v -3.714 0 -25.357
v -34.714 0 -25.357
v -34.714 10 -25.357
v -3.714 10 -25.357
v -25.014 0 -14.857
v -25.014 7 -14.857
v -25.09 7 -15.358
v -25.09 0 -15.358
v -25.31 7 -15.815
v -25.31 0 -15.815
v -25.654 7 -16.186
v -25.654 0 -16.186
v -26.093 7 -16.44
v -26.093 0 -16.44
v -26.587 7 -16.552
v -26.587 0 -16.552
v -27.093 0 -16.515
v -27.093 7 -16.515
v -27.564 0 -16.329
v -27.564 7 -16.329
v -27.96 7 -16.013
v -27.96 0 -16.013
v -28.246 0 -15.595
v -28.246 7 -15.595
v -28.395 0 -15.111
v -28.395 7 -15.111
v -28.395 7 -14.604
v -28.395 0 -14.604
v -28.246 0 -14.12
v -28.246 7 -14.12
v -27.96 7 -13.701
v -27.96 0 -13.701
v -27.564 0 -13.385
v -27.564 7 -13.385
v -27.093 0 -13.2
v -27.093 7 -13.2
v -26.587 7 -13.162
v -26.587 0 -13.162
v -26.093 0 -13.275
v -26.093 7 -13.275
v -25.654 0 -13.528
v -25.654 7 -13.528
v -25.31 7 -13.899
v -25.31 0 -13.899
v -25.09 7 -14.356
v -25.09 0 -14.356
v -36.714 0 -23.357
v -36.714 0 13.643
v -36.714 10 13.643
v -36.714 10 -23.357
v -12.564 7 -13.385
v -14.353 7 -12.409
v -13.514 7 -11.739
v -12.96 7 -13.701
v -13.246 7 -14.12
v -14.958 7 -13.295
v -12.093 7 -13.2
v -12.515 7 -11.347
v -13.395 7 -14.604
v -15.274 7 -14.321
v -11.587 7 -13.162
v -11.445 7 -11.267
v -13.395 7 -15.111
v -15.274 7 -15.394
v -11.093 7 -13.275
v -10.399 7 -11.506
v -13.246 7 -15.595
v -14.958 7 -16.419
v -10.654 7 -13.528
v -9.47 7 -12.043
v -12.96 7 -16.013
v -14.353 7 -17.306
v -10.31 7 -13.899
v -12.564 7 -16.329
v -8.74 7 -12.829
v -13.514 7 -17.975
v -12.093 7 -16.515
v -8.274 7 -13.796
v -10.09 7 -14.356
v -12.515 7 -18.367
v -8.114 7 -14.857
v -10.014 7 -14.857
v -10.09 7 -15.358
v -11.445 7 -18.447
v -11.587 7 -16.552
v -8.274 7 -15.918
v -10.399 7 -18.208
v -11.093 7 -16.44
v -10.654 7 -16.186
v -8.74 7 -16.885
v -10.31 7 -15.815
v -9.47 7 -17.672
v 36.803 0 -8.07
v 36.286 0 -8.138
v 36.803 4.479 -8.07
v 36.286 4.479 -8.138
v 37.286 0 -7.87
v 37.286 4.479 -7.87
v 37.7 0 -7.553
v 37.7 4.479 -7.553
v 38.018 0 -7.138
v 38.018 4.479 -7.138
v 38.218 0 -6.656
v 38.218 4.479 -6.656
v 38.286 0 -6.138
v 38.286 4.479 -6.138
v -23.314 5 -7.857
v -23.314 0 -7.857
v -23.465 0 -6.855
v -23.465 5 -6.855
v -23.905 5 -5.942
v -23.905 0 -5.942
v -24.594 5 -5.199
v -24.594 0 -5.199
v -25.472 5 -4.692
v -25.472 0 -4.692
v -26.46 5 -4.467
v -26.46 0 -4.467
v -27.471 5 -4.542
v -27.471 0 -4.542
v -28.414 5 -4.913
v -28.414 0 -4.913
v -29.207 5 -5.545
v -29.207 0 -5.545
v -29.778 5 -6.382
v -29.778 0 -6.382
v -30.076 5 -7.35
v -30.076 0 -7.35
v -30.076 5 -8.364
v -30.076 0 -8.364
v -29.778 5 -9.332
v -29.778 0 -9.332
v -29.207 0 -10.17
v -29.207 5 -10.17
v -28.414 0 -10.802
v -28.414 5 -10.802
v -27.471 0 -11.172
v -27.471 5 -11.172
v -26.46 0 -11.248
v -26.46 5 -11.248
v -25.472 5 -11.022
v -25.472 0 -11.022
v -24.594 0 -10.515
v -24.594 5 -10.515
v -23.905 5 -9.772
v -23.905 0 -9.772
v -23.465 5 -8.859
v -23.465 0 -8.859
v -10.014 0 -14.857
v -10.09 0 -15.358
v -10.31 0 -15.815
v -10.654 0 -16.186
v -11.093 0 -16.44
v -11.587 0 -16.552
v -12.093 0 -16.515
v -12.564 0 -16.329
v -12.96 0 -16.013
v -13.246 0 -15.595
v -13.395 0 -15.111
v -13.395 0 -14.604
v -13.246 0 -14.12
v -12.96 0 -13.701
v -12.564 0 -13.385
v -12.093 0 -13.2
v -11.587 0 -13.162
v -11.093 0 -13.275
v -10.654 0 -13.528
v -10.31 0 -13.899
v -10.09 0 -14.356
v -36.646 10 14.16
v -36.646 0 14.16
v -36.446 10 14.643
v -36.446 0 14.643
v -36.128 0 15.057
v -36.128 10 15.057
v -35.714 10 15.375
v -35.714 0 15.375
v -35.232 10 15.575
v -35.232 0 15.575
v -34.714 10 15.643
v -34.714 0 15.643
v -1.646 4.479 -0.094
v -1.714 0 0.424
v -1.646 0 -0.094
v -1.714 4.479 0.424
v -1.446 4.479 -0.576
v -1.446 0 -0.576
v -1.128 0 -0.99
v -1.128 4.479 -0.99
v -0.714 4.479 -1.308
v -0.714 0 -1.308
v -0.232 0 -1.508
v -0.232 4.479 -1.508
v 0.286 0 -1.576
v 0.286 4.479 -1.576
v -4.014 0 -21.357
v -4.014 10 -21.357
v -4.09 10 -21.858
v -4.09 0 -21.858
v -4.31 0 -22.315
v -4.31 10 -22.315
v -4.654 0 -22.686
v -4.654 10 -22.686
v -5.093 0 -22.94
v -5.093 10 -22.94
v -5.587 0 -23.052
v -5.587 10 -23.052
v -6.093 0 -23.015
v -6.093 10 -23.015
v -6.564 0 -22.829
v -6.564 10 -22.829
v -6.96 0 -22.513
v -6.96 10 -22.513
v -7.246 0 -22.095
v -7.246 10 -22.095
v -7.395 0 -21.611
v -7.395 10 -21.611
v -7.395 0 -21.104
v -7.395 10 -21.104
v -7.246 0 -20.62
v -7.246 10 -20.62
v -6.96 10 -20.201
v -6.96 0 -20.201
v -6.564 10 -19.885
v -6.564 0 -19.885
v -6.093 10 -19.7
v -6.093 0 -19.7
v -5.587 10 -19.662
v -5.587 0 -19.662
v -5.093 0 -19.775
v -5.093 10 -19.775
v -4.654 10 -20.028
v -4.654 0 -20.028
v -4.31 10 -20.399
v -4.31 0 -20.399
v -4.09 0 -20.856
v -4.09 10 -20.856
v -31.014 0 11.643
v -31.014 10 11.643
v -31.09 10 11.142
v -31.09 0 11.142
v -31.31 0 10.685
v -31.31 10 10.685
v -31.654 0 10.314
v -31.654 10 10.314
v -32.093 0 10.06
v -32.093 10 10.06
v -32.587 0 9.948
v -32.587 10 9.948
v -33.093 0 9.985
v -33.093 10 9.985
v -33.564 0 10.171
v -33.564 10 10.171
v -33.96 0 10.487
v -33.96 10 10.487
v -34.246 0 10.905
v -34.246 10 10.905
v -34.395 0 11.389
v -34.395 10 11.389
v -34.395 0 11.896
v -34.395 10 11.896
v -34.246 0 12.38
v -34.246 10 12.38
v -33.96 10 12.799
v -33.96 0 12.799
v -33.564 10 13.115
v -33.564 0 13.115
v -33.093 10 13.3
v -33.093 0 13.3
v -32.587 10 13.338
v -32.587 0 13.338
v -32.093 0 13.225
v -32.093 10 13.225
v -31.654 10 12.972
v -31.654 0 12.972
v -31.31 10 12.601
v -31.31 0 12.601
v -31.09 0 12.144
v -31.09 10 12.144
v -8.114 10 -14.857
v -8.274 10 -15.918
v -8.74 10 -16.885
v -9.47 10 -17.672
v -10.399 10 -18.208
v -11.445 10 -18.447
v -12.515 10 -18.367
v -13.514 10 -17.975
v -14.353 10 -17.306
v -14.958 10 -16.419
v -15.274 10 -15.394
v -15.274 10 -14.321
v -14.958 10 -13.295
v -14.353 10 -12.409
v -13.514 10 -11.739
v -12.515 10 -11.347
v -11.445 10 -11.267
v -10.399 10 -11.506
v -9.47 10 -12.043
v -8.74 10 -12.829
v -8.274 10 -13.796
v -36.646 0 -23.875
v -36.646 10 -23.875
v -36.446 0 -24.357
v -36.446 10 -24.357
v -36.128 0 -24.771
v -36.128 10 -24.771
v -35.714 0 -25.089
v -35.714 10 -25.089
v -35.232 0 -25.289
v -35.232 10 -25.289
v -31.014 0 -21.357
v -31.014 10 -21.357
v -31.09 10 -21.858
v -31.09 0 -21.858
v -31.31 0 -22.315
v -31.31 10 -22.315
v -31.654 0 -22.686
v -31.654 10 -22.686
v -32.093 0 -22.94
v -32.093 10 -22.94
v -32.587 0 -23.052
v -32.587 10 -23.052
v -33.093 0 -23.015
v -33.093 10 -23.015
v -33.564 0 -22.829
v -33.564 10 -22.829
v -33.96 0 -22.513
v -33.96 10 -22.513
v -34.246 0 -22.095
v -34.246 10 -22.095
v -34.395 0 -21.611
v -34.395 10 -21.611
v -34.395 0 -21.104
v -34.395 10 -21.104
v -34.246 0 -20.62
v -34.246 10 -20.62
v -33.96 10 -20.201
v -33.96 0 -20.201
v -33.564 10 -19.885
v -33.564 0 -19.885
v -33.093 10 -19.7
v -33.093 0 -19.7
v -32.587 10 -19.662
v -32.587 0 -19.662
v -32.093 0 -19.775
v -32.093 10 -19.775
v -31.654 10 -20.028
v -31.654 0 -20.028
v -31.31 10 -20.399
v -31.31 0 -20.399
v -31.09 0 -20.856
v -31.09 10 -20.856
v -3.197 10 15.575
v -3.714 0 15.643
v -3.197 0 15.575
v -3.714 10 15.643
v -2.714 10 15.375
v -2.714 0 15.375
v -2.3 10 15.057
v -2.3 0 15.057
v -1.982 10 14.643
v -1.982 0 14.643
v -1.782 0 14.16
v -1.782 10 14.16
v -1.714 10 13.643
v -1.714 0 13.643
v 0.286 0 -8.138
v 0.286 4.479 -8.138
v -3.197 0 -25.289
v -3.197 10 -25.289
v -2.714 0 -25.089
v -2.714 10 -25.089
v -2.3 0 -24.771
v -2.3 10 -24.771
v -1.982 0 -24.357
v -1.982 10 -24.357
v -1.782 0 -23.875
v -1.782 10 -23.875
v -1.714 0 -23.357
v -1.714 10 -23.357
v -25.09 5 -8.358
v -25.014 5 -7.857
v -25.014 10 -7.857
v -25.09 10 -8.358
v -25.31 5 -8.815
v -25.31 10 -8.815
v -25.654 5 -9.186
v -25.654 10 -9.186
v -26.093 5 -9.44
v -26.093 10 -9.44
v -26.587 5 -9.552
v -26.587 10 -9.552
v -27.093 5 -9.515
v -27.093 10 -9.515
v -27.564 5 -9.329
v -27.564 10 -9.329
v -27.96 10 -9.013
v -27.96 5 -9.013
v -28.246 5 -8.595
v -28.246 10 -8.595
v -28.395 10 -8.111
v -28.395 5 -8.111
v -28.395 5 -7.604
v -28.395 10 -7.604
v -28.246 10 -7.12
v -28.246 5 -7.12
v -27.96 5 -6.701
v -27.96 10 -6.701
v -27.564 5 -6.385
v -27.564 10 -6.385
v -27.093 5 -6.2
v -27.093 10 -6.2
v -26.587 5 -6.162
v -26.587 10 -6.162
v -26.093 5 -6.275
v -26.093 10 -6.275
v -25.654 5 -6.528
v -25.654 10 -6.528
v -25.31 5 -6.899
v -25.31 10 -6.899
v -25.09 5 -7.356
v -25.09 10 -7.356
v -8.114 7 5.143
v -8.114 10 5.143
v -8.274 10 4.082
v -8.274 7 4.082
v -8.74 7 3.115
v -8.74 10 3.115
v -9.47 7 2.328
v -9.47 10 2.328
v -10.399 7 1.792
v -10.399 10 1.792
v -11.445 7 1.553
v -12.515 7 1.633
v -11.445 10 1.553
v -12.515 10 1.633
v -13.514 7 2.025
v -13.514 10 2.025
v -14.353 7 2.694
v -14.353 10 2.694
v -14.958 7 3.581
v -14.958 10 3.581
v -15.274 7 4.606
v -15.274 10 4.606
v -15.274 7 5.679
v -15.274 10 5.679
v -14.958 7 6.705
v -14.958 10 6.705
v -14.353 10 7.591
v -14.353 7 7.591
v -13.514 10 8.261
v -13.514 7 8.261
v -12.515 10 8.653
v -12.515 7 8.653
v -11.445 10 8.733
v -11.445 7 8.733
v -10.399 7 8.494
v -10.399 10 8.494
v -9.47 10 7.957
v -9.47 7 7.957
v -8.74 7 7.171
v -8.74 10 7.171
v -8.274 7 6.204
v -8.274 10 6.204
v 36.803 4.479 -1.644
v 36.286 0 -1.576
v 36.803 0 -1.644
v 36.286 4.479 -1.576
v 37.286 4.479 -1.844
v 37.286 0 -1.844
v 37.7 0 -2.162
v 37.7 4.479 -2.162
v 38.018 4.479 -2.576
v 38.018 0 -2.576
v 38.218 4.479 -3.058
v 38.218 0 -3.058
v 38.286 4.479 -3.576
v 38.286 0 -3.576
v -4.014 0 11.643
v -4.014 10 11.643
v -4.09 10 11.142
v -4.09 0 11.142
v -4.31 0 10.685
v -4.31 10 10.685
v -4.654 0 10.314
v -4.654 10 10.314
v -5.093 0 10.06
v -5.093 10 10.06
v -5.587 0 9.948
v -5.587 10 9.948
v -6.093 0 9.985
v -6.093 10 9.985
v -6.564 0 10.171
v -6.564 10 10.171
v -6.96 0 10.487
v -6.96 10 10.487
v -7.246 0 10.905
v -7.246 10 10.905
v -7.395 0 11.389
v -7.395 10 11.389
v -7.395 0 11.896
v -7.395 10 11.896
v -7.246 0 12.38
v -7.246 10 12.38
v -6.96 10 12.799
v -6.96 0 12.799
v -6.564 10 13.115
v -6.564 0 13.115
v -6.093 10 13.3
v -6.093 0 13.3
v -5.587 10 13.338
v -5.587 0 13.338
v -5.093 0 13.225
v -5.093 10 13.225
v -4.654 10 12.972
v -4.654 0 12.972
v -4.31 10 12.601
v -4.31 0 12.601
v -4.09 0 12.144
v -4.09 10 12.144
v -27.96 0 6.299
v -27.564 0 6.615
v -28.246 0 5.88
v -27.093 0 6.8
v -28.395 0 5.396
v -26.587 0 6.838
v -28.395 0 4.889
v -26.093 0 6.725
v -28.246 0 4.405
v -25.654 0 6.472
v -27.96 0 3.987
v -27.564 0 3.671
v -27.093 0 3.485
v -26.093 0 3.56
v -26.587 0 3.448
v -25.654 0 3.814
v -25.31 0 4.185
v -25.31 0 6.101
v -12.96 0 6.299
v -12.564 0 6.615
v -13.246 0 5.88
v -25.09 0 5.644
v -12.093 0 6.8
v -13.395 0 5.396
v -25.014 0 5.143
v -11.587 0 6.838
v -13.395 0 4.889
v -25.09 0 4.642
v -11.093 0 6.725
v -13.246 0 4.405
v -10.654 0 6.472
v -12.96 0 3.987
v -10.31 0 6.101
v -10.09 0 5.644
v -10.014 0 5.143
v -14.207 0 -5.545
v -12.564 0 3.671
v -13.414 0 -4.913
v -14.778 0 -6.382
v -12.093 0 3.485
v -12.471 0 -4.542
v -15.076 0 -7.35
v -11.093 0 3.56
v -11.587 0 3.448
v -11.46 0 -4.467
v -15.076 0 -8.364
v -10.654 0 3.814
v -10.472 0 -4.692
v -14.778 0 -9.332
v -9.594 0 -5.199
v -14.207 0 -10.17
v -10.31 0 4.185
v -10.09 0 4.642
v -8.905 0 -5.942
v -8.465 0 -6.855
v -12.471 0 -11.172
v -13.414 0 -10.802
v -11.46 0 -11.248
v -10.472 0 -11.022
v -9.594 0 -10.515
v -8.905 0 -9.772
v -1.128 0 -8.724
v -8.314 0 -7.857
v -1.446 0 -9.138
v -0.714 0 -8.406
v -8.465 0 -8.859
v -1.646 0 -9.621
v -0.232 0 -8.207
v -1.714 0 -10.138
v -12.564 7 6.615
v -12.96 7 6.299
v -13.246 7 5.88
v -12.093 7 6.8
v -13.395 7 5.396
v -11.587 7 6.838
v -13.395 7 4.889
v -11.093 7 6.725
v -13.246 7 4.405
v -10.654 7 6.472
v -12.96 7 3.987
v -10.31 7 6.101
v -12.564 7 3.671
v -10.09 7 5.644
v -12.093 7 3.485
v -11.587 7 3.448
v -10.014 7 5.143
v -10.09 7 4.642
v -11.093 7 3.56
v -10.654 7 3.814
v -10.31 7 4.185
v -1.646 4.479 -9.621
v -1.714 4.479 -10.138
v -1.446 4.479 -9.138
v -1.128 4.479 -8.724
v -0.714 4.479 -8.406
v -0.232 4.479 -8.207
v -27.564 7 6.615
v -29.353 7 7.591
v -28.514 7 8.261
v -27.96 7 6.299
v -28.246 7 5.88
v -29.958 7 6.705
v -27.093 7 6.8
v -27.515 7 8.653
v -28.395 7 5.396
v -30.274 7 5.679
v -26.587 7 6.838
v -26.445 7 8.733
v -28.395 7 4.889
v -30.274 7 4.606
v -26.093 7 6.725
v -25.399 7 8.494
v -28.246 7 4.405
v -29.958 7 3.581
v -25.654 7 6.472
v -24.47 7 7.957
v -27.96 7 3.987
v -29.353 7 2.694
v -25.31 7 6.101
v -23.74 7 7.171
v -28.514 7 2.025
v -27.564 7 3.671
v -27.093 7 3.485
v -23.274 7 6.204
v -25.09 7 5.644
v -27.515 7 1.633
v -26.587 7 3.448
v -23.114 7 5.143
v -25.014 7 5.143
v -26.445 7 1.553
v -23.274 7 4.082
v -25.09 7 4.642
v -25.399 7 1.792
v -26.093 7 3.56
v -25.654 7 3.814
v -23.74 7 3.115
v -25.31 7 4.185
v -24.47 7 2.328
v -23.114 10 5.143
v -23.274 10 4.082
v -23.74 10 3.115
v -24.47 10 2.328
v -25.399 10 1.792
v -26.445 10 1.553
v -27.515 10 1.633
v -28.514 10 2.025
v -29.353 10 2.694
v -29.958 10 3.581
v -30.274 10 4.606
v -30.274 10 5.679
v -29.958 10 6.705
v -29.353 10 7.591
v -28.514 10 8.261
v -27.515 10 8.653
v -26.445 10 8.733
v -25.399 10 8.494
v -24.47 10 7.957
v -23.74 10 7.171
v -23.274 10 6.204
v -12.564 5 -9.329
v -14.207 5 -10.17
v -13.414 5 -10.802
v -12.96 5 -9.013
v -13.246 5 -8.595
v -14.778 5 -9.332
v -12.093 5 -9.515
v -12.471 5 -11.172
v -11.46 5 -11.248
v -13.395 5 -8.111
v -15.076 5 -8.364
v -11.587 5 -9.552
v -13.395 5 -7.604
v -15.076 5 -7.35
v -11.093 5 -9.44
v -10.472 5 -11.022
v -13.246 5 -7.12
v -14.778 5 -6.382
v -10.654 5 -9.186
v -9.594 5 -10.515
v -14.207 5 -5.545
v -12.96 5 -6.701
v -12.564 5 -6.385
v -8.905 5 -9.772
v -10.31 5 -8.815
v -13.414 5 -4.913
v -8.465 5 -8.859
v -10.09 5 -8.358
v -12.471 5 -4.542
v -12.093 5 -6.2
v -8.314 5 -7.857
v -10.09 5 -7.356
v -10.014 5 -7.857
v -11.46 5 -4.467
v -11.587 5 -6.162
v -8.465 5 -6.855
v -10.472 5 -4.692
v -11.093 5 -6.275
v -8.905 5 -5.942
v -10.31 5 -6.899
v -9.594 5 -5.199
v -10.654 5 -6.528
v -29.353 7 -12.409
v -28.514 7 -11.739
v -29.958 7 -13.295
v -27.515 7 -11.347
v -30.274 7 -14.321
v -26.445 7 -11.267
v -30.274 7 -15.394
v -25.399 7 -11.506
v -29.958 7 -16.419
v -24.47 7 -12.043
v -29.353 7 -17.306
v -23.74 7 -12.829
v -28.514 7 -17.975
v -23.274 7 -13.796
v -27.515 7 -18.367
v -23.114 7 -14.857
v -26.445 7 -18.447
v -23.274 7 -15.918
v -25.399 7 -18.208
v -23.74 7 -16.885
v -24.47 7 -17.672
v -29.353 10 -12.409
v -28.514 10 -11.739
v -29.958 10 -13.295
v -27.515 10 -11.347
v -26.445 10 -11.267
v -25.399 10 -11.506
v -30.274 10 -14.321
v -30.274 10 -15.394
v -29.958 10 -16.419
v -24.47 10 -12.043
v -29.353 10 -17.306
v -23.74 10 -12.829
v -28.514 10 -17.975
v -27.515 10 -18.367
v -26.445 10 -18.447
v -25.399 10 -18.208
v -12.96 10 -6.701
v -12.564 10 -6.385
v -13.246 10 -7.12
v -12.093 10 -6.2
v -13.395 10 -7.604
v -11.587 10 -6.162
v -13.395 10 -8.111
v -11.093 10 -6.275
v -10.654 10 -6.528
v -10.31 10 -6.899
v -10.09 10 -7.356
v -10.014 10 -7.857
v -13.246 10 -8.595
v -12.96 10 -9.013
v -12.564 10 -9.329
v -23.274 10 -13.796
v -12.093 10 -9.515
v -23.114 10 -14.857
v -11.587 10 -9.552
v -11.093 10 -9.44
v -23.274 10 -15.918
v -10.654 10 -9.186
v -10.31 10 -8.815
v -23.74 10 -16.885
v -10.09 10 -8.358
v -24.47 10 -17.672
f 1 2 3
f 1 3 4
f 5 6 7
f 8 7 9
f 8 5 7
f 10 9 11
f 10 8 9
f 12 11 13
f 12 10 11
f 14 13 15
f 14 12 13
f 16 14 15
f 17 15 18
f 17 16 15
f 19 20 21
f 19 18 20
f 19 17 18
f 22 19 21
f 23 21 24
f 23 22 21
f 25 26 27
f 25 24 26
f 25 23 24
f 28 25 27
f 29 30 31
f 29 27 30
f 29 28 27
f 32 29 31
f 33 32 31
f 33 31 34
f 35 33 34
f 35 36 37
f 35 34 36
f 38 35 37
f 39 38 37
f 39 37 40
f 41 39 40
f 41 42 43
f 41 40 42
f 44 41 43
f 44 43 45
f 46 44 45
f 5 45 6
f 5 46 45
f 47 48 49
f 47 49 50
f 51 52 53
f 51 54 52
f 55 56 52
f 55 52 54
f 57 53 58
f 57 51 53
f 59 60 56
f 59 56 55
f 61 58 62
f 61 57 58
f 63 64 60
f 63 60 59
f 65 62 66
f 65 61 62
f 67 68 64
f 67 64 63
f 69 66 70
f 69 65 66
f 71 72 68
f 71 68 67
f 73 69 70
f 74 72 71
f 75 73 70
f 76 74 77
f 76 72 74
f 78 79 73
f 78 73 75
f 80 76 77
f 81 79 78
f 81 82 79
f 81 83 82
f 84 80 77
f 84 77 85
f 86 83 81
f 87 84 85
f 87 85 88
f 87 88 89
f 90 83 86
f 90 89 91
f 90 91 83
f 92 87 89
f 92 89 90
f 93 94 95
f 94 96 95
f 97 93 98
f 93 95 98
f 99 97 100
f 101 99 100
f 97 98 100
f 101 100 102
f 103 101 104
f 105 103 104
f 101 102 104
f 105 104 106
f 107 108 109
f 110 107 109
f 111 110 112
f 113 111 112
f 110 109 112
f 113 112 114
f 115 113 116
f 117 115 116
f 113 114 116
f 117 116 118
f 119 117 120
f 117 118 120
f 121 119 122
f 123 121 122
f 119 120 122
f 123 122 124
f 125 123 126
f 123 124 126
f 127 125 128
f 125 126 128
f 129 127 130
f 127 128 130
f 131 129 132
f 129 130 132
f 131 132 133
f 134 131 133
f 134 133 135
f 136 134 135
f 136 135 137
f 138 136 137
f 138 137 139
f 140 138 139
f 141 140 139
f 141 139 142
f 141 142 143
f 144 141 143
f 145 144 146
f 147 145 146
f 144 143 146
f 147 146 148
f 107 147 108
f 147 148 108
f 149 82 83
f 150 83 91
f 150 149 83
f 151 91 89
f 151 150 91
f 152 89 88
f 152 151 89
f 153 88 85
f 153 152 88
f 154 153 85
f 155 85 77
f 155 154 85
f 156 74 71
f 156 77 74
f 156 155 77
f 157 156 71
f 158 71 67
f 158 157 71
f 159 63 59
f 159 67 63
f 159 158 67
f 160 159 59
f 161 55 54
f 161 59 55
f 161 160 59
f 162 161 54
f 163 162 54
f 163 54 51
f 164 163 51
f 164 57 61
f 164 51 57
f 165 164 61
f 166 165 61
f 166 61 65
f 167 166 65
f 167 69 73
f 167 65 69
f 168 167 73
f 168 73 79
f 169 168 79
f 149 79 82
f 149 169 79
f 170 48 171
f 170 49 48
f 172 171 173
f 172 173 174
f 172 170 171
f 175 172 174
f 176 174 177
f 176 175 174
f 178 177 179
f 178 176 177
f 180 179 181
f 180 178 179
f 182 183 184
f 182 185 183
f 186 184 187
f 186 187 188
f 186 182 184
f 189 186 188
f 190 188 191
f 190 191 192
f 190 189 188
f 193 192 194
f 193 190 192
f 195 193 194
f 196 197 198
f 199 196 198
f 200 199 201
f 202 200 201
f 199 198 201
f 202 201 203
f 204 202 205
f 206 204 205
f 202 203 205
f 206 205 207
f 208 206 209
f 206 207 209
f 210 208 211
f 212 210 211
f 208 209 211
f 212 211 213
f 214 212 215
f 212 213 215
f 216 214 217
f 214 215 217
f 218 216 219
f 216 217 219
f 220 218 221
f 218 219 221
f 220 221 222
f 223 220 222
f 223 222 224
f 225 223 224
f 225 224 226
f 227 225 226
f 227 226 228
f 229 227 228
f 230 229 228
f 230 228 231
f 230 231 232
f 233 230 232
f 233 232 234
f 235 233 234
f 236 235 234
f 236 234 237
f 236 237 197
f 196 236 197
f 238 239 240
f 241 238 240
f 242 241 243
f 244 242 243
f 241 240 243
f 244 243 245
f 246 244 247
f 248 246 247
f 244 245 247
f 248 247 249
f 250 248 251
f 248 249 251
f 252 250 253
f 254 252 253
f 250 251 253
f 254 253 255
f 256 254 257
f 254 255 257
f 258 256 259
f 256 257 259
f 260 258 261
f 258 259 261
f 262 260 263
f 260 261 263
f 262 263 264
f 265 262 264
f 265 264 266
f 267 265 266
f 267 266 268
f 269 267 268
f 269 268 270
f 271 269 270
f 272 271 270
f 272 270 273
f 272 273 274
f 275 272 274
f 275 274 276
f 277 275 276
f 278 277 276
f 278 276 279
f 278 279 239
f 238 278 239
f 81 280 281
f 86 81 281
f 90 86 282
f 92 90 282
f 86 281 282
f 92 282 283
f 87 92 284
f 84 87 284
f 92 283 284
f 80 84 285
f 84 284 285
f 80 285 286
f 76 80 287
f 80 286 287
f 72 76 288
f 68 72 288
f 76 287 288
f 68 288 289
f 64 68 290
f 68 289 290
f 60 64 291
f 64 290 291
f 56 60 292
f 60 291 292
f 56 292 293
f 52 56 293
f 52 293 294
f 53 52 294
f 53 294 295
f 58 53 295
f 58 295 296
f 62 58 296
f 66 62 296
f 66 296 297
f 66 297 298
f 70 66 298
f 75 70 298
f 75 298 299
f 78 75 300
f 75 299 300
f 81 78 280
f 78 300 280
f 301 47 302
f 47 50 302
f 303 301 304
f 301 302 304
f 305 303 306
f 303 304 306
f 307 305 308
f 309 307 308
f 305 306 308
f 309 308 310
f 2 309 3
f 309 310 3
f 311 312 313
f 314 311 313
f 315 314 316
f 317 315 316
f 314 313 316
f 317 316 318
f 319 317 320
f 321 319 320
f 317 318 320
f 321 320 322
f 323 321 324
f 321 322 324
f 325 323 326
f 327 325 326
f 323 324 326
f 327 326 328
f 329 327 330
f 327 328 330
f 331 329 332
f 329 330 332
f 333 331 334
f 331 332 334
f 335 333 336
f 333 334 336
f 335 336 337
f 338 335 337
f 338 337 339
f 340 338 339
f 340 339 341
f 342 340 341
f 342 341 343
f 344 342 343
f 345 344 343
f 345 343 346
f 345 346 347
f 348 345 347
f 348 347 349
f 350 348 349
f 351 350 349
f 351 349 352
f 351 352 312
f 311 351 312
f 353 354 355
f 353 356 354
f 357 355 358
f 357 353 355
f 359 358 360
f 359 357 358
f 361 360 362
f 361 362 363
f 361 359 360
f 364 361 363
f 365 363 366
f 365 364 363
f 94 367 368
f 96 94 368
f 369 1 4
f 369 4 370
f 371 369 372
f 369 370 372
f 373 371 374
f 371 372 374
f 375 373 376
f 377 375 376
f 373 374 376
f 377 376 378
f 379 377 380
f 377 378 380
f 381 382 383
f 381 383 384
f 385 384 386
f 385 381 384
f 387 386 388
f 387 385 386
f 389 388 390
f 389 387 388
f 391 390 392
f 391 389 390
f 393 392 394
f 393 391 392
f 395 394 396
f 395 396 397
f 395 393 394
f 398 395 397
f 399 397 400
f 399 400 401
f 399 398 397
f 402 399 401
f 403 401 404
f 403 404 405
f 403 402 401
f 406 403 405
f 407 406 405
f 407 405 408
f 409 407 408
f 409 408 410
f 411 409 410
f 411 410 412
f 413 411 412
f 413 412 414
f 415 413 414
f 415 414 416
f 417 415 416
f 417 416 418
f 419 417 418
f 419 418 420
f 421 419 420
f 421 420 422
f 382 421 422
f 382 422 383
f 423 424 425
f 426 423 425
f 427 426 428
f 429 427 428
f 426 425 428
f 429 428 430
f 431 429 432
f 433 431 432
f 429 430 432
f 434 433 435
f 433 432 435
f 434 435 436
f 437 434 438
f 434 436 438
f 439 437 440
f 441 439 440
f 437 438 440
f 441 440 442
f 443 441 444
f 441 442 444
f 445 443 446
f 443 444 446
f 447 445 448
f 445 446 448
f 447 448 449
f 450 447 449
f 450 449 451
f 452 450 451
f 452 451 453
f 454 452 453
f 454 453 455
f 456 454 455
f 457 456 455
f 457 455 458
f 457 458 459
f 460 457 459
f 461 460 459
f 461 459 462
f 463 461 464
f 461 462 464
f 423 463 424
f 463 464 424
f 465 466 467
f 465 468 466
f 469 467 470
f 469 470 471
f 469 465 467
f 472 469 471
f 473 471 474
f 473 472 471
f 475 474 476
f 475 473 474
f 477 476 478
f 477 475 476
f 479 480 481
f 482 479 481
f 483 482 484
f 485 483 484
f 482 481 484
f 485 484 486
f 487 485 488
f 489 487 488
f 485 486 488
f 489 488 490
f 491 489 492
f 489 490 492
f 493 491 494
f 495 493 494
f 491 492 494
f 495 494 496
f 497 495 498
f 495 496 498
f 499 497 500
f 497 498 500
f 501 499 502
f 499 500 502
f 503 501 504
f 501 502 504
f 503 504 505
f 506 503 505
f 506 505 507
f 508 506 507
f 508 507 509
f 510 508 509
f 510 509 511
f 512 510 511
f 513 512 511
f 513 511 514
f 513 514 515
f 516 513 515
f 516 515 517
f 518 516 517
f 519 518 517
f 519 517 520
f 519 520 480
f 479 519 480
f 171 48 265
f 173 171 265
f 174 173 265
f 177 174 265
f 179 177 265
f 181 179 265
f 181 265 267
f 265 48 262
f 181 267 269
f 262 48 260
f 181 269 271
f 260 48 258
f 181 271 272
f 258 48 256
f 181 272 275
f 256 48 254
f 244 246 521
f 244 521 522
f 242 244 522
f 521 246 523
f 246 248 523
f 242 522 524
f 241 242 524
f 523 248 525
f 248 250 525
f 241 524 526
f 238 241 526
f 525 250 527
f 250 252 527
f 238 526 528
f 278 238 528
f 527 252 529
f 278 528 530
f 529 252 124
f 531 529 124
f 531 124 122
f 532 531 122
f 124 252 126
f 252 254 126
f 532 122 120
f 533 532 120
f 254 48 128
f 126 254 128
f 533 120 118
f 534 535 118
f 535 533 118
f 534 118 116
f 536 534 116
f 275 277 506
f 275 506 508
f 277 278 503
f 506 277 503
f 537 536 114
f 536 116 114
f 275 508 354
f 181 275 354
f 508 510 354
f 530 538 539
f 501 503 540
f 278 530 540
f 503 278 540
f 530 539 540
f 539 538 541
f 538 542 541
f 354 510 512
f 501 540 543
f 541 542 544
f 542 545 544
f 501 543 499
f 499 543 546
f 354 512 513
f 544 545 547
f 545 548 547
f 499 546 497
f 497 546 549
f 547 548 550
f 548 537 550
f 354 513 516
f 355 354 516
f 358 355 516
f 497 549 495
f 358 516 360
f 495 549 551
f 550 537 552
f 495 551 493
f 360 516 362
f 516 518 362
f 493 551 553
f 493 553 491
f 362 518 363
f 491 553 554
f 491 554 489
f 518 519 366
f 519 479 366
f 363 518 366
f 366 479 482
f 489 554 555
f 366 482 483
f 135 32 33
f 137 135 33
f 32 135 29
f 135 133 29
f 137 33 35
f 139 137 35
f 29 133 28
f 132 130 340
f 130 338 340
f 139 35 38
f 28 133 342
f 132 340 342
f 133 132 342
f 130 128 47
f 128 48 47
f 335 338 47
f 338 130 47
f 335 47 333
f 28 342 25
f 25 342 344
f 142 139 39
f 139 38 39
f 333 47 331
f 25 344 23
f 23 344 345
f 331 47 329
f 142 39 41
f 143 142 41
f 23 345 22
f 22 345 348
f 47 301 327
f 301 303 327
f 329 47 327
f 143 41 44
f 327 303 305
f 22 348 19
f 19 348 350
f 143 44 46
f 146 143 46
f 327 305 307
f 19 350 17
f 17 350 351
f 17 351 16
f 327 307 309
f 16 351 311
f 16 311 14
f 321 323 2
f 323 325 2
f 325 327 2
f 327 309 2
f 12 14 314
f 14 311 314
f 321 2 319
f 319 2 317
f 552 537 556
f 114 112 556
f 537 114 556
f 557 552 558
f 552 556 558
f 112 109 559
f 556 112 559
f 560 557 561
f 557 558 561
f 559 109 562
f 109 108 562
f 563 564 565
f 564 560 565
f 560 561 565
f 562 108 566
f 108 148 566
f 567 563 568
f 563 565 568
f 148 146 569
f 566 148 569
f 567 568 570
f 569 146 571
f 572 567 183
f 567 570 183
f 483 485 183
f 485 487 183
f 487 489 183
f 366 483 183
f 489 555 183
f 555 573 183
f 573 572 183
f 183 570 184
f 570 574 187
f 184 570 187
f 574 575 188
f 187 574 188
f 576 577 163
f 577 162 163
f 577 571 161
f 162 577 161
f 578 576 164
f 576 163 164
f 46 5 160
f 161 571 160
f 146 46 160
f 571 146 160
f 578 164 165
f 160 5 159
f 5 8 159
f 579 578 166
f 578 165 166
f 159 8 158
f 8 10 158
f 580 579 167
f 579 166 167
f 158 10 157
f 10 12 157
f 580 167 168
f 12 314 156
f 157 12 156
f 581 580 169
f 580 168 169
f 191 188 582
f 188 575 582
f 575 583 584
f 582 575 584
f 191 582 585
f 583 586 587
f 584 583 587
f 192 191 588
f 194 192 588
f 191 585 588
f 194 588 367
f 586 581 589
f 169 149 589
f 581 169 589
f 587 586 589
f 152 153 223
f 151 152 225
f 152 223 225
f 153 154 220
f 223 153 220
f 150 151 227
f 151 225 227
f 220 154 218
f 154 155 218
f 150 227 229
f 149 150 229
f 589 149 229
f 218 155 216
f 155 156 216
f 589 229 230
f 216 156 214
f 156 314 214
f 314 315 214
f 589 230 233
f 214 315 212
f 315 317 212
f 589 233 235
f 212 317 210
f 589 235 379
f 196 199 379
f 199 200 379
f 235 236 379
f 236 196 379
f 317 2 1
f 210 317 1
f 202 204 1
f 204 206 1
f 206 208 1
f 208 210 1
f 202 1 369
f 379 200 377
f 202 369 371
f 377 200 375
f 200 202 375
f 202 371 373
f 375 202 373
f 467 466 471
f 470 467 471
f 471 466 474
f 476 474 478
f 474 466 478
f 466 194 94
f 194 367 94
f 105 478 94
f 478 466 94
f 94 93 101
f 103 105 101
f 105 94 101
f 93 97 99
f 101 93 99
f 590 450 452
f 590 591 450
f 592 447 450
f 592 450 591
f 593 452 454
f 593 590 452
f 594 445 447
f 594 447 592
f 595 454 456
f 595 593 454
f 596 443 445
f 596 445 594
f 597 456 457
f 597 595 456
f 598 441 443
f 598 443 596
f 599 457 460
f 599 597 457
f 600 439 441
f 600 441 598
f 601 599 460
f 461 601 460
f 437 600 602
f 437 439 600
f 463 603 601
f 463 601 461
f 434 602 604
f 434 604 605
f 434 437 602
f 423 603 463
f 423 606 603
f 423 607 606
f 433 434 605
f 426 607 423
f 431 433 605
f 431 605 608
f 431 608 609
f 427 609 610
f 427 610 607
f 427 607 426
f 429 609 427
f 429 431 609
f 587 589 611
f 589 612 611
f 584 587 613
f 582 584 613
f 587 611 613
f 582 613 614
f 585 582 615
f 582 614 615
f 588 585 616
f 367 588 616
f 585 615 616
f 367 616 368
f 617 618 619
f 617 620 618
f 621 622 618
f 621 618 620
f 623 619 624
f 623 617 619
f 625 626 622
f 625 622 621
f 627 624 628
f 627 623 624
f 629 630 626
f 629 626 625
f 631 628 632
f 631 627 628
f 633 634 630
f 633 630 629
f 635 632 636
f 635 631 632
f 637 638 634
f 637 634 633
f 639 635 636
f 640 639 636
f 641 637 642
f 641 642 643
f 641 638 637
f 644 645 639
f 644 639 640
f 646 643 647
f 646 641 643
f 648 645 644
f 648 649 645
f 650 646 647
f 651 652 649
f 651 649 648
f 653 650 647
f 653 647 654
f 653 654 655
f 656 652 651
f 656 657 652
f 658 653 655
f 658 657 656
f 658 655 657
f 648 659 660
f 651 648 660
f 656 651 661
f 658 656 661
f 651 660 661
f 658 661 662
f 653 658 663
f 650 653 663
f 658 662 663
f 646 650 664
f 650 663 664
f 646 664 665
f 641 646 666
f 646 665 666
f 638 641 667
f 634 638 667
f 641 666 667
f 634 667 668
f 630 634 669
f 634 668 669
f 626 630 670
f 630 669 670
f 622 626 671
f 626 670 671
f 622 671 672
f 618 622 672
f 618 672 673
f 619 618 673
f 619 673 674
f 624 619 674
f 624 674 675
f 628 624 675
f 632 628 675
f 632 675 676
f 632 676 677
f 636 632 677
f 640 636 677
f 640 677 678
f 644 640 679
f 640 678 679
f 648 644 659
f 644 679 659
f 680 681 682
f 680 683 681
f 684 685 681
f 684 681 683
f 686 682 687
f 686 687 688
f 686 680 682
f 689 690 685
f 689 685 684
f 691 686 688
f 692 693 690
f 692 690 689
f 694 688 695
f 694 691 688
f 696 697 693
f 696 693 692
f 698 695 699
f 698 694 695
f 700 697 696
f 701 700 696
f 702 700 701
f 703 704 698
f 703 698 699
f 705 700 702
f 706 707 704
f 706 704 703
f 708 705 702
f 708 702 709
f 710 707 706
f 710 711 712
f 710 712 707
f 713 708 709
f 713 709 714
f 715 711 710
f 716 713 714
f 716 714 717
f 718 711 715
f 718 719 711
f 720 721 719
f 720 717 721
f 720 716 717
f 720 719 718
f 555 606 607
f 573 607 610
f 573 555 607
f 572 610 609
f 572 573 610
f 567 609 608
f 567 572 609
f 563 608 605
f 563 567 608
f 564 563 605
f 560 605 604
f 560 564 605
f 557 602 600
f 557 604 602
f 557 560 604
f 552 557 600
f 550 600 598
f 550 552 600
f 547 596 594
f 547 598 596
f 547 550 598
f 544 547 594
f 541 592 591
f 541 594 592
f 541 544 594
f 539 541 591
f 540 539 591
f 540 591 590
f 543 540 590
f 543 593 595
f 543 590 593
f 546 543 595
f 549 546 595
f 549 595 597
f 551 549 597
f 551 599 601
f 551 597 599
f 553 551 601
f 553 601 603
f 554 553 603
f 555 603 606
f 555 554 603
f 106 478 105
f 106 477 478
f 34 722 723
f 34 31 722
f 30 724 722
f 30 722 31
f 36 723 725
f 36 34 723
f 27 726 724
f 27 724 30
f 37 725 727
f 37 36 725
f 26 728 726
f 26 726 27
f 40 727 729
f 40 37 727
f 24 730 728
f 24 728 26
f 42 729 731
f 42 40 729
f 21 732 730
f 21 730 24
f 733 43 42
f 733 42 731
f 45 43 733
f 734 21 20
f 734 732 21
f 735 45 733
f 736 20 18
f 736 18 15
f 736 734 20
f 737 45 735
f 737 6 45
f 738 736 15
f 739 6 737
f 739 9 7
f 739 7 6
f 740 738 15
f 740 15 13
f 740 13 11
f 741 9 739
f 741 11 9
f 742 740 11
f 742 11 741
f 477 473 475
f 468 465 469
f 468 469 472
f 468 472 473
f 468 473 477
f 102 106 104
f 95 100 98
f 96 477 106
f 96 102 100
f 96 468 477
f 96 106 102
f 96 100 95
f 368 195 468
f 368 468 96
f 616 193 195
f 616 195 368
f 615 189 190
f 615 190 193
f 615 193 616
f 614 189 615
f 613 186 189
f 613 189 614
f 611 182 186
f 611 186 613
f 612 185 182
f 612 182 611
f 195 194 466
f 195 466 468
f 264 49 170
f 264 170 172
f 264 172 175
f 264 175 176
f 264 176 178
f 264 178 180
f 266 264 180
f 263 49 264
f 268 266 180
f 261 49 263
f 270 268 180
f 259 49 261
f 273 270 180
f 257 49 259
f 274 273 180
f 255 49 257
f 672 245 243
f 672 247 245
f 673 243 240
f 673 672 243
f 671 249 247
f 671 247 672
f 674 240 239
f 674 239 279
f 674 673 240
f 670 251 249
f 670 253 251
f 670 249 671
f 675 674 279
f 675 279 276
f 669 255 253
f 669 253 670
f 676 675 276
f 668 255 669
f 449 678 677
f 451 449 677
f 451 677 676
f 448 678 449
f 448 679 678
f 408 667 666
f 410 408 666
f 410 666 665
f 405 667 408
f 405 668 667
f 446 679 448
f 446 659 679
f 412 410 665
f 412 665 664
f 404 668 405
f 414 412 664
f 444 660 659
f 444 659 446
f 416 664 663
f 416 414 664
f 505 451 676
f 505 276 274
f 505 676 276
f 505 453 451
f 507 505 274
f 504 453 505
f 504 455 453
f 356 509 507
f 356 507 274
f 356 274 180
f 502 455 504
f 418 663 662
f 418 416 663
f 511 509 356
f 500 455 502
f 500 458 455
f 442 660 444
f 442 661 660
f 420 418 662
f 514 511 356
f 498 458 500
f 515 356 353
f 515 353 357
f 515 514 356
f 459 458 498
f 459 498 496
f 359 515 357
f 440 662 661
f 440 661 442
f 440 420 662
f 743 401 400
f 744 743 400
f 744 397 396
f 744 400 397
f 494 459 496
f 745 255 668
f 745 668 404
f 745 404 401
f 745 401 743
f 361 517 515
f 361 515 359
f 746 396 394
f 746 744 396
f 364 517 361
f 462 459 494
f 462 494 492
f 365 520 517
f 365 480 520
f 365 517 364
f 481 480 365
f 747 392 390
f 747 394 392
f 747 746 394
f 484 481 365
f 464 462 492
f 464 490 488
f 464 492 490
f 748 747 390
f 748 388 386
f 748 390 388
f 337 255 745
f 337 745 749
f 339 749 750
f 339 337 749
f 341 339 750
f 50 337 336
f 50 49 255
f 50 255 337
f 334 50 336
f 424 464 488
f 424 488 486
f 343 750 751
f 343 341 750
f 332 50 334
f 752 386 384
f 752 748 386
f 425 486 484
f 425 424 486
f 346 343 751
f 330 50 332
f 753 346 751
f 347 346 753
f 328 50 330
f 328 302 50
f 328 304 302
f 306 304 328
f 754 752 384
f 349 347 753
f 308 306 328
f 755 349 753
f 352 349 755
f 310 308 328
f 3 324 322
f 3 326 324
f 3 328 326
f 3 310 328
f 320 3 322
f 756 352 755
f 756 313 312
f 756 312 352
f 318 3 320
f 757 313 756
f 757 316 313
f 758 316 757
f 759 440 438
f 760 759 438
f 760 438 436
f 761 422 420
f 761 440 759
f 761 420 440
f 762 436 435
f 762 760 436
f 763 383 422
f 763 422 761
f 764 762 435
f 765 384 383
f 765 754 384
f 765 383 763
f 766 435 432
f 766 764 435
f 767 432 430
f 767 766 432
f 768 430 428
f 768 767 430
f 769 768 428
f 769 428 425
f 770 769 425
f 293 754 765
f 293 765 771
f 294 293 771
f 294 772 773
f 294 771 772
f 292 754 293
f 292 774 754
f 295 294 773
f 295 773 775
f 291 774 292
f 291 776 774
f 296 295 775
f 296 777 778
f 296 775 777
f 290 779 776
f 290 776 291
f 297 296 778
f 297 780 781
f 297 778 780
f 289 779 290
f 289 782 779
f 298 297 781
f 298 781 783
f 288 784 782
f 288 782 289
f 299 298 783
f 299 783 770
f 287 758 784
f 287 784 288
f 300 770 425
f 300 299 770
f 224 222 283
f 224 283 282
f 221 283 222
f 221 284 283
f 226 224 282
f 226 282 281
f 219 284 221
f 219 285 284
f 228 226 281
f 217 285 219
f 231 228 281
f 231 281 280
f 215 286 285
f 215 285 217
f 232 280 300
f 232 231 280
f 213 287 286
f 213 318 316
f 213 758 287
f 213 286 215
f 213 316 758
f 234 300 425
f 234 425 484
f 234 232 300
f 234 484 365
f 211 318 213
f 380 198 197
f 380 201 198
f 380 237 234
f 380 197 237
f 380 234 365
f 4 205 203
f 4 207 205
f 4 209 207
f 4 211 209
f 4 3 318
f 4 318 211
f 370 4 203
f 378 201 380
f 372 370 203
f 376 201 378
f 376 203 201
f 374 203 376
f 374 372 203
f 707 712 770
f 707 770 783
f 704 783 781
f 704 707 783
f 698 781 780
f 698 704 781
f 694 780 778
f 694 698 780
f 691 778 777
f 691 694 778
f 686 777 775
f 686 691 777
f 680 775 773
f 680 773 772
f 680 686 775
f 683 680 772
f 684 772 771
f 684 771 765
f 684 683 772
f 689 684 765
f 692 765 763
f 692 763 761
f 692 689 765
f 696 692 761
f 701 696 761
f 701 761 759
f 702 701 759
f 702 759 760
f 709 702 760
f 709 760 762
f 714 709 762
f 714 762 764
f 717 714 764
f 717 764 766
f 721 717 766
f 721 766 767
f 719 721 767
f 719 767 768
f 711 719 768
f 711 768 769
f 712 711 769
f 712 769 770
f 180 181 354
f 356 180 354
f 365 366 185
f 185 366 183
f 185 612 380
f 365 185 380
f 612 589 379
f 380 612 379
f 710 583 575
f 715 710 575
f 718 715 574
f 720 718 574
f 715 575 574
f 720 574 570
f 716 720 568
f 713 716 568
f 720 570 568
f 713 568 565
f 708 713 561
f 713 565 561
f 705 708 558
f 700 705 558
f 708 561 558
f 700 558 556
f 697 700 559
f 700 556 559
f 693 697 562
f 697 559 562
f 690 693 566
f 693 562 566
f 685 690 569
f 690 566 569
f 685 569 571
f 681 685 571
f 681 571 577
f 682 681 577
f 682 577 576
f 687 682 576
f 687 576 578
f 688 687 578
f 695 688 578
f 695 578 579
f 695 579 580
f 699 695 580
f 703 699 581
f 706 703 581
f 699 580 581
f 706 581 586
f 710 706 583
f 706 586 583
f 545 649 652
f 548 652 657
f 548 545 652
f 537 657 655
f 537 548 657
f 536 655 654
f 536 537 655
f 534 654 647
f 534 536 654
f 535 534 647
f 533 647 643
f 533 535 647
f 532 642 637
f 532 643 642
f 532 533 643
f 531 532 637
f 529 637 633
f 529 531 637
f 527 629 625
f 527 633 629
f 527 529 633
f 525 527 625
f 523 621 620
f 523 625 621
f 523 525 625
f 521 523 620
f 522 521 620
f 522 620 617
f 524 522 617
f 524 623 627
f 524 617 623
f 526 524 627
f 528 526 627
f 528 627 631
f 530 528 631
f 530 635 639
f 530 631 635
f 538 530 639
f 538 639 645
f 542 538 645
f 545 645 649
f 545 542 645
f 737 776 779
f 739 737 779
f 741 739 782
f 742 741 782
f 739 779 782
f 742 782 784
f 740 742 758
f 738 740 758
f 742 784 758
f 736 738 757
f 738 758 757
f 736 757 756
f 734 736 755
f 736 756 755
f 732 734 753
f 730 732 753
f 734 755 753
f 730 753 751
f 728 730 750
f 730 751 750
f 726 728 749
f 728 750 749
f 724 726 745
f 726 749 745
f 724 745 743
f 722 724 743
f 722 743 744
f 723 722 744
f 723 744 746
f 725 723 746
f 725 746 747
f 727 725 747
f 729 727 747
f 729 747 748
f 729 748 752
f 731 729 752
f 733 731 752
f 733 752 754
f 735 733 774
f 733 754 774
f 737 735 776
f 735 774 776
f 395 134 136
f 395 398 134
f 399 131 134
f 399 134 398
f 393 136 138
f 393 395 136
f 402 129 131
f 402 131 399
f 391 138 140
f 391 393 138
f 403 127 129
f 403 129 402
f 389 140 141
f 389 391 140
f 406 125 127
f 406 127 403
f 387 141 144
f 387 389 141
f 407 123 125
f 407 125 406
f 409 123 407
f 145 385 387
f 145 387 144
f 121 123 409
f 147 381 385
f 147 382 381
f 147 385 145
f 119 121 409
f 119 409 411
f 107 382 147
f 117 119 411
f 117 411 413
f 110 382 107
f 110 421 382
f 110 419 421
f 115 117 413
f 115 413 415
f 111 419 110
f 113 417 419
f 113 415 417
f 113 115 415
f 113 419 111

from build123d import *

# Parameters (mm, degrees)
SKETCH_1_W          = 35
SKETCH_1_H          = 41
SKETCH_1_R          = 1.7
EXTRUDE_1_DEPTH     = 10
SKETCH_2_R          = 3.6
CUT_EXTRUDE_1_DEPTH = 3
SKETCH_3_R          = 3.4
CUT_EXTRUDE_2_DEPTH = 5
SKETCH_4_R          = 1.7
CUT_EXTRUDE_3_DEPTH = 11
FILLET_1_R          = 2
SKETCH_5_W          = 6.562454648
SKETCH_5_H          = 4.478703739
EXTRUDE_2_DEPTH     = 40
FILLET_2_R          = 2


with BuildPart() as part:
    # 草图1 → 凸台-拉伸1 (new body)
    with BuildSketch(Plane(origin=(0, 0, 0), x_dir=(1, 0, 0), z_dir=(0, 1, 0))):
        with Locations((-19.214285714, 4.857142857)):
            Rectangle(SKETCH_1_W, SKETCH_1_H)
        with Locations((-26.714285714, 14.857142857)):
            Circle(SKETCH_1_R, mode=Mode.SUBTRACT)
        with Locations((-11.714285714, 14.857142857)):
            Circle(SKETCH_1_R, mode=Mode.SUBTRACT)
        with Locations((-11.714285714, -5.142857143)):
            Circle(SKETCH_1_R, mode=Mode.SUBTRACT)
        with Locations((-26.714285714, -5.142857143)):
            Circle(SKETCH_1_R, mode=Mode.SUBTRACT)
        with Locations((-11.714285714, 7.857142857)):
            Circle(SKETCH_1_R, mode=Mode.SUBTRACT)
        with Locations((-26.714285714, 7.857142857)):
            Circle(SKETCH_1_R, mode=Mode.SUBTRACT)
    extrude(amount=EXTRUDE_1_DEPTH)

    # 草图2 → 切除-拉伸1 (cut)
    with BuildSketch(Plane(origin=(0, 10, 0), x_dir=(1, 0, 0), z_dir=(0, 1, 0))):
        with Locations((-26.714285714, -5.142857143)):
            Circle(SKETCH_2_R)
        with Locations((-11.714285714, -5.142857143)):
            Circle(SKETCH_2_R)
        with Locations((-11.714285714, 14.857142857)):
            Circle(SKETCH_2_R)
        with Locations((-26.714285714, 14.857142857)):
            Circle(SKETCH_2_R)
    extrude(amount=-CUT_EXTRUDE_1_DEPTH, mode=Mode.SUBTRACT)

    # 草图3 → 切除-拉伸2 (cut)
    with BuildSketch(Plane.XZ):
        with Locations((-11.714285714, -7.857142857)):
            Circle(SKETCH_3_R)
        with Locations((-26.714285714, -7.857142857)):
            Circle(SKETCH_3_R)
    extrude(amount=-CUT_EXTRUDE_2_DEPTH, mode=Mode.SUBTRACT)

    # 草图4 → 切除-拉伸3 (cut, through all)
    with BuildSketch(Plane(origin=(0, 10, 0), x_dir=(1, 0, 0), z_dir=(0, 1, 0))):
        with Locations((-32.714285714, 21.357142857)):
            Circle(SKETCH_4_R)
        with Locations((-5.714285714, 21.357142857)):
            Circle(SKETCH_4_R)
        with Locations((-5.714285714, -11.642857143)):
            Circle(SKETCH_4_R)
        with Locations((-32.714285714, -11.642857143)):
            Circle(SKETCH_4_R)
    extrude(amount=-CUT_EXTRUDE_3_DEPTH, mode=Mode.SUBTRACT)

    # 圆角1
    fillet_1_edges = [part.edges().sort_by_distance(p)[0] for p in [
        (-36.714285714, 5, -25.357142857),
        (-1.714285714, 5, -25.357142857),
        (-1.714285714, 5, 15.642857143),
        (-36.714285714, 5, 15.642857143),
    ]]
    fillet(fillet_1_edges, radius=FILLET_1_R)

    # 草图5 → 凸台-拉伸2 (add)
    with BuildSketch(Plane(origin=(-1.714285714, 0, 0), x_dir=(0, 0, -1), z_dir=(1, 0, 0))):
        with Locations((4.857142857, 2.23935187)):
            Rectangle(SKETCH_5_W, SKETCH_5_H)
    extrude(amount=EXTRUDE_2_DEPTH)

    # 圆角2
    fillet_2_edges = [part.edges().sort_by_distance(p)[0] for p in [
        (-1.714285714, 2.239351869, -8.138370181),
        (-1.714285714, 2.239351869, -1.575915533),
        (38.285714286, 2.239351869, -8.138370181),
        (38.285714286, 2.239351869, -1.575915533),
    ]]
    fillet(fillet_2_edges, radius=FILLET_2_R)


solid = part.part
